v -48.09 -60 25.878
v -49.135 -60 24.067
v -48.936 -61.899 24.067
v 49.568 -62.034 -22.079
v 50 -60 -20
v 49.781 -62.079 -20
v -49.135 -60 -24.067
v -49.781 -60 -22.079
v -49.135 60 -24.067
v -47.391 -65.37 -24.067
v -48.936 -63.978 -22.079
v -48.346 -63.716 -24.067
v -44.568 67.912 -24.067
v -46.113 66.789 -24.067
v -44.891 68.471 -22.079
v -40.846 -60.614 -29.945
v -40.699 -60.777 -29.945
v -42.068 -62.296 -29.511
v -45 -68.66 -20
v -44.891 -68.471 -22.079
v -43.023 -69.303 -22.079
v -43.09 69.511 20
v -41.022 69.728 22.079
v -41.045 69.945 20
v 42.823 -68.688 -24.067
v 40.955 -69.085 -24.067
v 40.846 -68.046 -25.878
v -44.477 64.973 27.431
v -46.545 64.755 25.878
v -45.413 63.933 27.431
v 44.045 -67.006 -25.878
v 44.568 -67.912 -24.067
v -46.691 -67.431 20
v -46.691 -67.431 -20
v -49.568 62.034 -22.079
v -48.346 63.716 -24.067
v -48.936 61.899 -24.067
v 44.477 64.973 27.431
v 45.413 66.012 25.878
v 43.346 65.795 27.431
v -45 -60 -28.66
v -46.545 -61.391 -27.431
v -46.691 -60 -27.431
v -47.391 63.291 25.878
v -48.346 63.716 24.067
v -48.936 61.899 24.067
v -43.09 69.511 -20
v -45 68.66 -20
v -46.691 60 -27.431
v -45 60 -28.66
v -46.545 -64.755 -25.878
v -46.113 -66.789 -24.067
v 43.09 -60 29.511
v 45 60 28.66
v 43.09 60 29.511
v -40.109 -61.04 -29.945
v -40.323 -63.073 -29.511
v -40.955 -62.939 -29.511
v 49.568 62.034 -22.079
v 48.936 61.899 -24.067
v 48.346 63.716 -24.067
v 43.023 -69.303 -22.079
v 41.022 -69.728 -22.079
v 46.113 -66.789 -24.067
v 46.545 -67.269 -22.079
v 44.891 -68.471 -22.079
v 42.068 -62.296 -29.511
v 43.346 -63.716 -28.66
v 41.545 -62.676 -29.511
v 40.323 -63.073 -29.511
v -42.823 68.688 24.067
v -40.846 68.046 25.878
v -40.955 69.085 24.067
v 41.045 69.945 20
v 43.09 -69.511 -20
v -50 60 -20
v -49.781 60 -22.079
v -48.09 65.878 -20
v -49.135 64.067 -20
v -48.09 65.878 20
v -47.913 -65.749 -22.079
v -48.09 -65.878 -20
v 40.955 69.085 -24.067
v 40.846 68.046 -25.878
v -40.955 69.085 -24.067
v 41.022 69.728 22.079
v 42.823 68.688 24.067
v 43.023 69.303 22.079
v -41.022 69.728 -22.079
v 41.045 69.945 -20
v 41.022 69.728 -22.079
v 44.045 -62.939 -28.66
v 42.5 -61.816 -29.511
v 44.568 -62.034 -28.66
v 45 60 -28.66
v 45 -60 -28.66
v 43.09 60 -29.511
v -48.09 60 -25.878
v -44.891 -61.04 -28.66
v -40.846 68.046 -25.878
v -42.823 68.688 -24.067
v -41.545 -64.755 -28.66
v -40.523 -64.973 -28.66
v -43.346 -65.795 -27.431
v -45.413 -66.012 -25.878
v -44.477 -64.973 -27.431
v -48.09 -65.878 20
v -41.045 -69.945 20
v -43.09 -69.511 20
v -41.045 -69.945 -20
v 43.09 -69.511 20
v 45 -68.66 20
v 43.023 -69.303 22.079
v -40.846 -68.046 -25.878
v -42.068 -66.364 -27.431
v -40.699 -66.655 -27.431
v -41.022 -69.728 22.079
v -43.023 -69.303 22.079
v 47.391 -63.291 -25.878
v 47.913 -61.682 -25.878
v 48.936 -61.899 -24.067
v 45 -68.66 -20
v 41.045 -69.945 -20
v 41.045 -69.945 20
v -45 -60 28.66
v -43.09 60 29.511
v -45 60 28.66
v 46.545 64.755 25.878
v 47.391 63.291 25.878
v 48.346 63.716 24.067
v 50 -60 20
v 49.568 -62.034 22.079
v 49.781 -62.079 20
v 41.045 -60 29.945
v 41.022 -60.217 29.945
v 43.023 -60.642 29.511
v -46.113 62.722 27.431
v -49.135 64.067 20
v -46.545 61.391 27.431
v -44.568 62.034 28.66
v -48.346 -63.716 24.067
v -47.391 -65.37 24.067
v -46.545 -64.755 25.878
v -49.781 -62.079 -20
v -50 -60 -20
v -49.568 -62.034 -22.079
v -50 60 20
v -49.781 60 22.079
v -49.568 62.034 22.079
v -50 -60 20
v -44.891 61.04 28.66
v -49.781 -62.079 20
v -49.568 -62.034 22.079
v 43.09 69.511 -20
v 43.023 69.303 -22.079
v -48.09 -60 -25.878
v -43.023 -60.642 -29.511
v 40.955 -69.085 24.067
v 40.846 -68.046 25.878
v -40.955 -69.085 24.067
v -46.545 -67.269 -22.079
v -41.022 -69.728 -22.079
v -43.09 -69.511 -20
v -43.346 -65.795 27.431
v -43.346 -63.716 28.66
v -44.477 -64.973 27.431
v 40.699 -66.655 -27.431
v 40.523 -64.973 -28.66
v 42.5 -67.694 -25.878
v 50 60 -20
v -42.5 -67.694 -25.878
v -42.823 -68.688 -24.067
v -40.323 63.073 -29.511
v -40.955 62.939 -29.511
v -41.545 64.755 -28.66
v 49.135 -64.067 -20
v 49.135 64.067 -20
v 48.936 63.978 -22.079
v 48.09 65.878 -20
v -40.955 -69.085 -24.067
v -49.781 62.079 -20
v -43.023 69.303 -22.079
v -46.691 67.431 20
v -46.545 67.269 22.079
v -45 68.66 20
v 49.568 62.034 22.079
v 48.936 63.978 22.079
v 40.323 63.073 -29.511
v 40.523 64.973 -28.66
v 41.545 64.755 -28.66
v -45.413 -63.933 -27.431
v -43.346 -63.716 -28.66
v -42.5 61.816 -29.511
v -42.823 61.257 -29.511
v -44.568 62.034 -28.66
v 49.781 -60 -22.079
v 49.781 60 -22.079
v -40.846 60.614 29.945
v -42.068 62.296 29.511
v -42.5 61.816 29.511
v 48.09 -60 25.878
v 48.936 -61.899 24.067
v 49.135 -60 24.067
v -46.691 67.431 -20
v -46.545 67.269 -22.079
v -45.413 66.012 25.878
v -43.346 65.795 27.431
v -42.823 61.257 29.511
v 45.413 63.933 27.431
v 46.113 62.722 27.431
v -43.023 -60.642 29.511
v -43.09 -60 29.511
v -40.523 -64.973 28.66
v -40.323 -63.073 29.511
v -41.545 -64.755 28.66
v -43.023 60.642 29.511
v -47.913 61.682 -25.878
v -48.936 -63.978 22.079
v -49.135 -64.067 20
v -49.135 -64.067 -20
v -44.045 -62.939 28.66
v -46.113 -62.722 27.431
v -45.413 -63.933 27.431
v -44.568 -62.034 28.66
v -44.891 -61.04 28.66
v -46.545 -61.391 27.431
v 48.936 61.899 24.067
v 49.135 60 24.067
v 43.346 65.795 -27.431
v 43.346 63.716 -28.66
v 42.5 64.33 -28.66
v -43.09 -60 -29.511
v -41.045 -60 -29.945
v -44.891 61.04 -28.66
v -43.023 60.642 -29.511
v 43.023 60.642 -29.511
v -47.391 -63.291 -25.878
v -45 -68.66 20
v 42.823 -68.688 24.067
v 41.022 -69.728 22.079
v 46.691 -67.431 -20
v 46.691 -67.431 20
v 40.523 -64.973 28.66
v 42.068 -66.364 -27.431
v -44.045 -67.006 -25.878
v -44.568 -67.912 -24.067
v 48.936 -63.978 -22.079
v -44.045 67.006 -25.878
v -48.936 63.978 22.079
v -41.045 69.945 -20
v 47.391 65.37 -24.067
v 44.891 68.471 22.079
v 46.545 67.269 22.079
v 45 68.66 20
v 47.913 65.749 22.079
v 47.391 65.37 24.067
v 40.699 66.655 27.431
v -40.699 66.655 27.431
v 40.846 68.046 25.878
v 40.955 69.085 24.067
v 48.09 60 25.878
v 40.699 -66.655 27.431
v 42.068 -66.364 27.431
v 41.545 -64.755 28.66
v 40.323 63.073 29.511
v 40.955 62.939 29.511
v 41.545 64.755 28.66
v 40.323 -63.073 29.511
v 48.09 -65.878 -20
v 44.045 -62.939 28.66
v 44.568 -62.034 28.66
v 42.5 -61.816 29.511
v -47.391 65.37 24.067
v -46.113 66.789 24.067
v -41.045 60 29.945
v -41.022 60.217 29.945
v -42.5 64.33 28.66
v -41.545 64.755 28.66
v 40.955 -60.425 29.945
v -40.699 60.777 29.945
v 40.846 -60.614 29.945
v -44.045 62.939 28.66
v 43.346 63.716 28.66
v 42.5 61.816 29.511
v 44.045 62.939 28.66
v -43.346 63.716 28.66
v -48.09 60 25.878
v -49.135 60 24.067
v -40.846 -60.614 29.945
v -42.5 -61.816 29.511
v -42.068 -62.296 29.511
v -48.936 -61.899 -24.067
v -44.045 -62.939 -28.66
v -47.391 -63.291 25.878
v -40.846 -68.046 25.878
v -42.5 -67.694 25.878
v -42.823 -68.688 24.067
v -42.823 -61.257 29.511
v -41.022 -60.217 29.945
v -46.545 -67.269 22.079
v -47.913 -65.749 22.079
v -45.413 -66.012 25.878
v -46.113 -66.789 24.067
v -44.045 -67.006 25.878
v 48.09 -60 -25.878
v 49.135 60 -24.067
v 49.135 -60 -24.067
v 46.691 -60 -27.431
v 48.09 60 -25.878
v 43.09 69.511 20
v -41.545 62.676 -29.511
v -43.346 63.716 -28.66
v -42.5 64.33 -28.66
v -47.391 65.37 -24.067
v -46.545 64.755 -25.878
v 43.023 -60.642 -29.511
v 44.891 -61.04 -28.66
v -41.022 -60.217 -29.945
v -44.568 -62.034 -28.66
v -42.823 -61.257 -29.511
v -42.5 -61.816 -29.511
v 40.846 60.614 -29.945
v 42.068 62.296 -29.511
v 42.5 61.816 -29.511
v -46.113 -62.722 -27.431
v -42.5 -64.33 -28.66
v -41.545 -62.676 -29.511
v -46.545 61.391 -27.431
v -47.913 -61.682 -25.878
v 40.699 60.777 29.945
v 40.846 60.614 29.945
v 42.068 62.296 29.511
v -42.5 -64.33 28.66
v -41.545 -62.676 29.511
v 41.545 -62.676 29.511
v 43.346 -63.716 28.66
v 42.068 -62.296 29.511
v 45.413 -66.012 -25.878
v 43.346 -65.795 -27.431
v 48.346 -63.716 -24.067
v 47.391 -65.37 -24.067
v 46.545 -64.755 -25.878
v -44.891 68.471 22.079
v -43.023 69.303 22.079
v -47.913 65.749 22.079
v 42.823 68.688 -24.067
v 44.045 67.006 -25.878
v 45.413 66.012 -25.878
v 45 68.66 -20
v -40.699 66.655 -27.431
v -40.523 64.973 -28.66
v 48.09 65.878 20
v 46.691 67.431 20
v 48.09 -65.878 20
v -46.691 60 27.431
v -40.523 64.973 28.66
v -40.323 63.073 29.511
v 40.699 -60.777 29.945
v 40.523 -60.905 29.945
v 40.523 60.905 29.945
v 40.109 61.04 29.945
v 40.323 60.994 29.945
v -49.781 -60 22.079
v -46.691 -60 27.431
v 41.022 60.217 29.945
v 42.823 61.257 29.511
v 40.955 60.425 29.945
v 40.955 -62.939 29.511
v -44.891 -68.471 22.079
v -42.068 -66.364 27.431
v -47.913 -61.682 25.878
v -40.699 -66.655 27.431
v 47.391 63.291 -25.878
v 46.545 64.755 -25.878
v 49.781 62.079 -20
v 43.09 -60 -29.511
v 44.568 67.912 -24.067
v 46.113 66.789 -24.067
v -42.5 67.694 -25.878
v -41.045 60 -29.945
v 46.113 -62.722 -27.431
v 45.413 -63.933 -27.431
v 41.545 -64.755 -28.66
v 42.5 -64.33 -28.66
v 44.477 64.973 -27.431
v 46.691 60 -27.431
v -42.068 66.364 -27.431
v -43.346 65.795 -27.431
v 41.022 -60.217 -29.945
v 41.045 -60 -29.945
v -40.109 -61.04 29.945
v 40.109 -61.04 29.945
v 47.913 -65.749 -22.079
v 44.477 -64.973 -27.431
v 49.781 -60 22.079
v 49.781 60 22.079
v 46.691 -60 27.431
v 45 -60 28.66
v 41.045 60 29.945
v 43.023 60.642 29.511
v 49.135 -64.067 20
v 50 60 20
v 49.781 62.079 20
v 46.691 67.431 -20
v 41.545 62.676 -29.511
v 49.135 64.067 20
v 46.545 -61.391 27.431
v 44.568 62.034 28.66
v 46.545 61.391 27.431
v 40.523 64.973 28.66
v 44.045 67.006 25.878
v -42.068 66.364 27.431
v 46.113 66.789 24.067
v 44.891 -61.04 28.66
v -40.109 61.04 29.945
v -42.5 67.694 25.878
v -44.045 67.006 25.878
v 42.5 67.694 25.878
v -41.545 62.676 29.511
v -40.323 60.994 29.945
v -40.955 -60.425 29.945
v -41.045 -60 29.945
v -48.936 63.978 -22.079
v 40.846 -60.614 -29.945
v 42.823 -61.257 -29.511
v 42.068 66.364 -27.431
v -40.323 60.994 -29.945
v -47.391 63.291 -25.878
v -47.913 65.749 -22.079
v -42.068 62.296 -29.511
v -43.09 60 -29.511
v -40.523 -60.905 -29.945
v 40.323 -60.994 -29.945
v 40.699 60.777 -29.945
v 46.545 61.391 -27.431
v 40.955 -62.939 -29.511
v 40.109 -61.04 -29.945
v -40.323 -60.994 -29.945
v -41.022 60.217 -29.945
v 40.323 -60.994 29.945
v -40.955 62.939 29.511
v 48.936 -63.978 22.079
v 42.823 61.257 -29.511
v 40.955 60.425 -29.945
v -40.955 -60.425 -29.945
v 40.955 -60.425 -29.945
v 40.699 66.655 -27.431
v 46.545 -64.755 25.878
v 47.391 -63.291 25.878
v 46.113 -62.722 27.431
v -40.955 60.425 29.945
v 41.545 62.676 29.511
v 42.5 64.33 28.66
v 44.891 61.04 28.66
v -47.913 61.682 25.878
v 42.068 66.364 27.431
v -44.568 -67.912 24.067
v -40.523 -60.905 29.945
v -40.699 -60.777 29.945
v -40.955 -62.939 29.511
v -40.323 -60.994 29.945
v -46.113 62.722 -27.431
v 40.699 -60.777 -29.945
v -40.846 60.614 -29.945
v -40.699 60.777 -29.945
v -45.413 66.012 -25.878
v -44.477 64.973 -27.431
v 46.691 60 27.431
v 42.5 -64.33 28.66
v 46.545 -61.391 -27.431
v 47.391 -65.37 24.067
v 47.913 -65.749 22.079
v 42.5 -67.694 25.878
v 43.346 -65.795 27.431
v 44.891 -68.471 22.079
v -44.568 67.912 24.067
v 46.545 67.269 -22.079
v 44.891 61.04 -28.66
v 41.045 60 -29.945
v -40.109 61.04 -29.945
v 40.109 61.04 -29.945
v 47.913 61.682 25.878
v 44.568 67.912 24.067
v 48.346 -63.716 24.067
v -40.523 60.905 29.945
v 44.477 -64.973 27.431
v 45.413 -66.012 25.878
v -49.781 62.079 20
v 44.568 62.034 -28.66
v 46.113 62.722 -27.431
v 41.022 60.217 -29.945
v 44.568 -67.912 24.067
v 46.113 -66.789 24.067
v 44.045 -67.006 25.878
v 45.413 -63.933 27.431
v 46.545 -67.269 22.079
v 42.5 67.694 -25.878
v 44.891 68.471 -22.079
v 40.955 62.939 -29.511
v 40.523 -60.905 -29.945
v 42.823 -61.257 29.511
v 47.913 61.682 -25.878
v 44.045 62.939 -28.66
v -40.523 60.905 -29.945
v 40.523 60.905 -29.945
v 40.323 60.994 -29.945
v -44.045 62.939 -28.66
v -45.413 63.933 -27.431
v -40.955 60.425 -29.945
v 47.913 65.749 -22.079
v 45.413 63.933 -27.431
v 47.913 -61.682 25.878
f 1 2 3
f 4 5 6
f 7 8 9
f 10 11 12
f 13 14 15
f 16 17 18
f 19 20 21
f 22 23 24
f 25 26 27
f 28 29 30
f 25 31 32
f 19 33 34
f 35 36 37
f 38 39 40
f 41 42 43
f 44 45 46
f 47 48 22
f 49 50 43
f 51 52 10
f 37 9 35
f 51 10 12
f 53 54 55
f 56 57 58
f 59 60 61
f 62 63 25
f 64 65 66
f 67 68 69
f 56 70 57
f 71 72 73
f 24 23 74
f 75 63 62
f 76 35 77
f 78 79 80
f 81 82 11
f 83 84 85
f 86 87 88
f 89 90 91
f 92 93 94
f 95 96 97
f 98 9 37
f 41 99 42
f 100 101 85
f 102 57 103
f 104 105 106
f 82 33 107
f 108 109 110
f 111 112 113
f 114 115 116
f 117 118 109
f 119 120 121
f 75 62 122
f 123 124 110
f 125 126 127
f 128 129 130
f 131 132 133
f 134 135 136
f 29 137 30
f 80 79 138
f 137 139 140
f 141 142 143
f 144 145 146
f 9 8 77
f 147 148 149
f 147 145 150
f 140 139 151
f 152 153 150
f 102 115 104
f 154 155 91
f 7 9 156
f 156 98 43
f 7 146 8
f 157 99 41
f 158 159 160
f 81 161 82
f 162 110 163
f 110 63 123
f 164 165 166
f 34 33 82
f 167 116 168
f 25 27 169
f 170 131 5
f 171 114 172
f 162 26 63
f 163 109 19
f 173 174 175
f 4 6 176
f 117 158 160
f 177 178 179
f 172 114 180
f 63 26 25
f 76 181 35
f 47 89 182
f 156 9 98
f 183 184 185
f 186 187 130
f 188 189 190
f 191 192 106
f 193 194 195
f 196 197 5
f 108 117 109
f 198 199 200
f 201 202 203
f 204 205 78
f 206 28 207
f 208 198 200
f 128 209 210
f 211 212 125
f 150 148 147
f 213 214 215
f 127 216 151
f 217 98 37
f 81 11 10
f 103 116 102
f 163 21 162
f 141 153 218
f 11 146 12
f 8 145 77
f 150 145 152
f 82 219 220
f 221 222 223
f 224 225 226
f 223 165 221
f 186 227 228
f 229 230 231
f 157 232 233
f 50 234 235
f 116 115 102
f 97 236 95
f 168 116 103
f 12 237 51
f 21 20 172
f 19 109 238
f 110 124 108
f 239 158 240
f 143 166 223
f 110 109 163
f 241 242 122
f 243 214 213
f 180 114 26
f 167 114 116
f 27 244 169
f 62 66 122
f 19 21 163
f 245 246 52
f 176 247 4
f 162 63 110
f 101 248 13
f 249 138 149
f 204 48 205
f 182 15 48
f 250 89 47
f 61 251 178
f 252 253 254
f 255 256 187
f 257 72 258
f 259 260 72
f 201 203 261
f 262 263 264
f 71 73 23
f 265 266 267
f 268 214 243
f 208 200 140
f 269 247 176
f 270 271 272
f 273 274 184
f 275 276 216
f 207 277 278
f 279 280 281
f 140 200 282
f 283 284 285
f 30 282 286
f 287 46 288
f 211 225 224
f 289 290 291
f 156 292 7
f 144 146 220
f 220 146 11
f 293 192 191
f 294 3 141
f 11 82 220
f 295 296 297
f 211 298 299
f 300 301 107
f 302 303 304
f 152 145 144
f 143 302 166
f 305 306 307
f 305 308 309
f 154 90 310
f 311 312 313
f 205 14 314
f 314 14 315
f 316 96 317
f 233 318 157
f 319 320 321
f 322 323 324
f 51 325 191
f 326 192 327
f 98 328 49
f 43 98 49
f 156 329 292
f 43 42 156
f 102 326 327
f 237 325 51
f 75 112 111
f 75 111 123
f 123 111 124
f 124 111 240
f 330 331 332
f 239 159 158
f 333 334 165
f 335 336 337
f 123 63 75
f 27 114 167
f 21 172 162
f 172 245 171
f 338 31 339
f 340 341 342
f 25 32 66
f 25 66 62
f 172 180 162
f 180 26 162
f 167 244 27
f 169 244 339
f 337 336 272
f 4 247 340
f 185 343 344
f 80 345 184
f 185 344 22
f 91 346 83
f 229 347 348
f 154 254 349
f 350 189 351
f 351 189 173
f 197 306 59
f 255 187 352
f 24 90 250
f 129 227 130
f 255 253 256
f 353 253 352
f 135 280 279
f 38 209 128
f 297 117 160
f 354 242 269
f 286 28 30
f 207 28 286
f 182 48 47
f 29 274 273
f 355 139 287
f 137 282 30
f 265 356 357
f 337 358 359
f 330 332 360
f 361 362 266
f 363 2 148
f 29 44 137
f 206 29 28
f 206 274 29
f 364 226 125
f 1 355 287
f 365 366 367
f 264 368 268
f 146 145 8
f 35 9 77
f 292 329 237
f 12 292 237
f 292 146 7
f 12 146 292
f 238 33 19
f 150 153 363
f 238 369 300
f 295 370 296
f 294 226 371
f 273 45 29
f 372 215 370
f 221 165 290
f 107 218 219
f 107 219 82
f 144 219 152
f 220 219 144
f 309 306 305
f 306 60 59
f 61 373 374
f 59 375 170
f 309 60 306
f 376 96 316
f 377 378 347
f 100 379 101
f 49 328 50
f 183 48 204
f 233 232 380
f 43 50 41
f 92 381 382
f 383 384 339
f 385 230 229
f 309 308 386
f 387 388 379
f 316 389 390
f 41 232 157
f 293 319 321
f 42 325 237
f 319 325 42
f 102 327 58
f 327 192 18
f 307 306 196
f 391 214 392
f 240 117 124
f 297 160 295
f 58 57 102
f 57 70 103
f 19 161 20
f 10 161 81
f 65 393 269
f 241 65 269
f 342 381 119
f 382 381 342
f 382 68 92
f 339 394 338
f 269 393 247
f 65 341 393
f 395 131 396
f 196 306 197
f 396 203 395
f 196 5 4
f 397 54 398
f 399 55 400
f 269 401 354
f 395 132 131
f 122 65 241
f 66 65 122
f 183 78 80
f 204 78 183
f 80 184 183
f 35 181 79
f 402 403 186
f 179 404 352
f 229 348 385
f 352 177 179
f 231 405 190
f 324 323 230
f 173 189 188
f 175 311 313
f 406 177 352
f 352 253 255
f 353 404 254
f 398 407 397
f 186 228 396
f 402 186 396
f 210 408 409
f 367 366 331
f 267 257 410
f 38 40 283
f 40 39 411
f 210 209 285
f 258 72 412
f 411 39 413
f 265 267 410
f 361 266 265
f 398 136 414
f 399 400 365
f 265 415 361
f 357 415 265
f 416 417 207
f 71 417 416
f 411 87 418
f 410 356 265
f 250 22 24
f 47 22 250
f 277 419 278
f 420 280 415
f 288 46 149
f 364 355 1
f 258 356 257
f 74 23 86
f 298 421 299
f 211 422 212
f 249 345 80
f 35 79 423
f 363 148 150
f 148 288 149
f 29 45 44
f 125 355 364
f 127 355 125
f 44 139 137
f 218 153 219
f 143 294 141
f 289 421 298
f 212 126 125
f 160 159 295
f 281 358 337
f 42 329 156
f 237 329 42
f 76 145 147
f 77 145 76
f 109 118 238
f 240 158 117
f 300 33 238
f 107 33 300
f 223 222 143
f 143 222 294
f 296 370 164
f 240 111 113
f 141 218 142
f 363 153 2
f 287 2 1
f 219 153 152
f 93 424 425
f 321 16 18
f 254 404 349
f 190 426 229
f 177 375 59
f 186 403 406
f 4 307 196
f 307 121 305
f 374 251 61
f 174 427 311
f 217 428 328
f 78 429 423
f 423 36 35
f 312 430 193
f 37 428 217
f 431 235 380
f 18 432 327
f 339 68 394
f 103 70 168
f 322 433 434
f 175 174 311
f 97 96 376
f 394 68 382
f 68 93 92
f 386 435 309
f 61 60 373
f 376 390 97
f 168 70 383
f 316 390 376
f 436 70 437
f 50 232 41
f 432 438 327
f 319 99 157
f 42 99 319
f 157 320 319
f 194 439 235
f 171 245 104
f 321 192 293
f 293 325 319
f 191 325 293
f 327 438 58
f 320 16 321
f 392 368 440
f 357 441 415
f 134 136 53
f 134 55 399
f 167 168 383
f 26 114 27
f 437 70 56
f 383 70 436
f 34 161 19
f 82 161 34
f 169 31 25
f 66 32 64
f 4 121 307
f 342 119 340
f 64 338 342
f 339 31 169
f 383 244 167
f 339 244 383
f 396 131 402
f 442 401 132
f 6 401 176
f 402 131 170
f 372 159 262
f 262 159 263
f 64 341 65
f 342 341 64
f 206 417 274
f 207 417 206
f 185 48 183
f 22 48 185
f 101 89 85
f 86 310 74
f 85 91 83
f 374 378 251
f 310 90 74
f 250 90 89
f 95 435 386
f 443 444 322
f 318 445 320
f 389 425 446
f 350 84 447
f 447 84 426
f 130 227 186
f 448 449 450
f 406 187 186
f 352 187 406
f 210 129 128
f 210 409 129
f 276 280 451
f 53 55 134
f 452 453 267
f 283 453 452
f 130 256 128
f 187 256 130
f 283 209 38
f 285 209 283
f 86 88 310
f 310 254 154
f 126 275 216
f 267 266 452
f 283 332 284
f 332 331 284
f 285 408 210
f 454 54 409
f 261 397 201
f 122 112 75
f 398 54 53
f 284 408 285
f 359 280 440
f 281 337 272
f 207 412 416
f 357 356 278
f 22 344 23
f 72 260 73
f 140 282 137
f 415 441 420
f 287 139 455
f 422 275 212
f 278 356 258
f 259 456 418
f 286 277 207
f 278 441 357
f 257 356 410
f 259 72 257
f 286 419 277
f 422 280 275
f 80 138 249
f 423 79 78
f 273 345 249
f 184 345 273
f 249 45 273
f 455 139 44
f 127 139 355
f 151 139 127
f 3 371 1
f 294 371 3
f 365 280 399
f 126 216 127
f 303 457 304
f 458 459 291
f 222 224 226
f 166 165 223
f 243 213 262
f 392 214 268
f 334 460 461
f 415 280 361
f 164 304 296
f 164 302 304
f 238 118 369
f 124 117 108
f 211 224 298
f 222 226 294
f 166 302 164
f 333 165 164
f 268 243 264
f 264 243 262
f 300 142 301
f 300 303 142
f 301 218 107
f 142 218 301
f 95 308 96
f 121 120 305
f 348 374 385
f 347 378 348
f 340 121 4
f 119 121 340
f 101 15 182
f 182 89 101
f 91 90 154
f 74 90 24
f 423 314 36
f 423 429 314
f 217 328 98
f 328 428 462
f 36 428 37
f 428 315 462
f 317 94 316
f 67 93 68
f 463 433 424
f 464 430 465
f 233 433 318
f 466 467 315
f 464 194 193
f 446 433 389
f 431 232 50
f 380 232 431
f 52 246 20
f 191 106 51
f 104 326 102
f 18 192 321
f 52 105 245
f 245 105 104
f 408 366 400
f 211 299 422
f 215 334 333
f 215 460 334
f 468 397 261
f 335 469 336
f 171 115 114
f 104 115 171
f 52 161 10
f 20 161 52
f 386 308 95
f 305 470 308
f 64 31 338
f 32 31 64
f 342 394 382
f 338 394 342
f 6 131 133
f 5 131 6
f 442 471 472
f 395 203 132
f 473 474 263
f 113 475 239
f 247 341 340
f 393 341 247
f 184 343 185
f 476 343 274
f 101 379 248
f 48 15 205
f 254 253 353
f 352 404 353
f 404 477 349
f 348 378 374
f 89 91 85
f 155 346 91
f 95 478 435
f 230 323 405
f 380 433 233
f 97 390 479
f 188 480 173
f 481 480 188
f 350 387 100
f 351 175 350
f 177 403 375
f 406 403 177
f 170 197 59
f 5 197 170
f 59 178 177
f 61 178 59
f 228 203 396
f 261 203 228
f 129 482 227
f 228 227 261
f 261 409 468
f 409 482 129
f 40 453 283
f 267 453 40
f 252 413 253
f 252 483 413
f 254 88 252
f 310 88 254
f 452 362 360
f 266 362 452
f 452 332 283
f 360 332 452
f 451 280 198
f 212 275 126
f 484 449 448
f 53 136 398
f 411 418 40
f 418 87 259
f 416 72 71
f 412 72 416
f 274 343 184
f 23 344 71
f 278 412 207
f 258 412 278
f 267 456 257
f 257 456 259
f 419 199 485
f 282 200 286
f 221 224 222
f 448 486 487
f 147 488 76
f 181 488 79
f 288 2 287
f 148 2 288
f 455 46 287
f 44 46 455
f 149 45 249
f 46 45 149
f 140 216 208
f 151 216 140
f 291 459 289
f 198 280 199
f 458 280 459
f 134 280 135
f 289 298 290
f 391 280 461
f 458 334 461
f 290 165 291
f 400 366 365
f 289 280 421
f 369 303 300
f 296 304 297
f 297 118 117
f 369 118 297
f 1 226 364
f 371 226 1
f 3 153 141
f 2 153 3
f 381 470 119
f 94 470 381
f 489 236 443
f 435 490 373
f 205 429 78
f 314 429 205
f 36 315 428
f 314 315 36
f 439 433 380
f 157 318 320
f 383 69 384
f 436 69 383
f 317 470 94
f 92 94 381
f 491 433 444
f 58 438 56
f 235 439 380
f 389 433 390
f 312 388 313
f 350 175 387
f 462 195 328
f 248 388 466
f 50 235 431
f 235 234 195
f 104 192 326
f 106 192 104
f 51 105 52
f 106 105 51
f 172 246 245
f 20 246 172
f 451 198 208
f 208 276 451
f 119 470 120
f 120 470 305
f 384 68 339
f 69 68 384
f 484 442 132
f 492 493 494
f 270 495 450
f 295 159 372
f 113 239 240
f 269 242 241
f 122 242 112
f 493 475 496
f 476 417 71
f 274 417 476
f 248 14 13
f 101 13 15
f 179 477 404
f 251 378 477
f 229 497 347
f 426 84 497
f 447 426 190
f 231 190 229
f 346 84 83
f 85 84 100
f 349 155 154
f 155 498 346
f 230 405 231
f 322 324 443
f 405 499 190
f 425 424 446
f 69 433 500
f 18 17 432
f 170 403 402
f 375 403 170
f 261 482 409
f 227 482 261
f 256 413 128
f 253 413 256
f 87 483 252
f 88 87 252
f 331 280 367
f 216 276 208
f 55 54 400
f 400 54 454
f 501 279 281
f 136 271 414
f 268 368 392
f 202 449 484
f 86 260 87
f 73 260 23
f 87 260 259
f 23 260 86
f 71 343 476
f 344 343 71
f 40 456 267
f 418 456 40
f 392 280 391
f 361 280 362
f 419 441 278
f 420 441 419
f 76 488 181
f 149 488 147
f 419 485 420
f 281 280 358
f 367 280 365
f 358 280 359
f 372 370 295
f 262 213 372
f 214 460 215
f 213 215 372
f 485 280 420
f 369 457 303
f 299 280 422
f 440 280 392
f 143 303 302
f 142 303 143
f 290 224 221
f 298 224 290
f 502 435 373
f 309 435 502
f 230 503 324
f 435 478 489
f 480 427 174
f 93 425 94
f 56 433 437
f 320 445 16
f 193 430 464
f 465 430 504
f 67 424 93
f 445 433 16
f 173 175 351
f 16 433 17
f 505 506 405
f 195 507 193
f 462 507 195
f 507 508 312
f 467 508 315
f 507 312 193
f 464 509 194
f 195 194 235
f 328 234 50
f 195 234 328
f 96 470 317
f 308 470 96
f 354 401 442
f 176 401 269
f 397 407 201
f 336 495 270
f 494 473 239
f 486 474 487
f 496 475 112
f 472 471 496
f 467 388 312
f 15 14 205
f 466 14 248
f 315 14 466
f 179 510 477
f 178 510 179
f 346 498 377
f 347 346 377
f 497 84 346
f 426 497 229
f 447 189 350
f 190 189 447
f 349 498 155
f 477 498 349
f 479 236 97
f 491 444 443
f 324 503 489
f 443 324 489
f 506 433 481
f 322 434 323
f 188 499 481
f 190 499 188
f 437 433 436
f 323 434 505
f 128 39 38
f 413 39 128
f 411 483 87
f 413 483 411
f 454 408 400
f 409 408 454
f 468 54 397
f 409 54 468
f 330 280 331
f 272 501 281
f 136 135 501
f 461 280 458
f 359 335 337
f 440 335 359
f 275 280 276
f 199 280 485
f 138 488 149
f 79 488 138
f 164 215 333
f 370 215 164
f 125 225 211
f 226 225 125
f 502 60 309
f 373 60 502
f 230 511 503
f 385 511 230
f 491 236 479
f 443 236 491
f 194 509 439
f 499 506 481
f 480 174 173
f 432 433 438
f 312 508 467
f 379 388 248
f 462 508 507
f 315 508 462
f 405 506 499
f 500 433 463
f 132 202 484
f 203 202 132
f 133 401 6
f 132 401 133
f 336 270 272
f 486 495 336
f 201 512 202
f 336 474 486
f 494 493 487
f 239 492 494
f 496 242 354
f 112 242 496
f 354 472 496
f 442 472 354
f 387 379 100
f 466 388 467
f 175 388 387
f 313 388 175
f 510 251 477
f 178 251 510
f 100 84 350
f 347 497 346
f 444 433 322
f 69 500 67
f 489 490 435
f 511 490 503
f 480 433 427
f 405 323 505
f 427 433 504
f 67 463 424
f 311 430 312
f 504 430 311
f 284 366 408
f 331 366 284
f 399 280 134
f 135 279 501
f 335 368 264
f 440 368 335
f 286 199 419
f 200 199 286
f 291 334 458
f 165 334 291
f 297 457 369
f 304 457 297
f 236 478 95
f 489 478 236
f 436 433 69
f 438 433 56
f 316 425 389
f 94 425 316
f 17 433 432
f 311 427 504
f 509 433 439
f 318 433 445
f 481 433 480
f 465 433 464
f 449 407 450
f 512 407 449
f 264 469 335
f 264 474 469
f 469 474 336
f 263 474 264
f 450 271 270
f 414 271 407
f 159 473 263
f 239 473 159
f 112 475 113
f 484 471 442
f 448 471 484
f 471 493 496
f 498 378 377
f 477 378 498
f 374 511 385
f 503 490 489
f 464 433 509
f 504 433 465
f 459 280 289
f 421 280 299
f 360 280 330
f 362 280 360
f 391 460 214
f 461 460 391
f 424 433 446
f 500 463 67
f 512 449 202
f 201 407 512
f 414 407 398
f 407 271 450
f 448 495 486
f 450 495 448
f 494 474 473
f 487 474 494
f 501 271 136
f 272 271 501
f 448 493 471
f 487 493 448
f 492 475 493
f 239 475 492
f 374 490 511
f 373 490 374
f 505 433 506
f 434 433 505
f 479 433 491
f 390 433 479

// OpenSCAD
x = 40;
y = 60;
z = 20;

points = [
    [-x, -y, -z],
    [-x, -y, z],
    [-x, y, -z],
    [-x, y, z],
    [x, -y, -z],
    [x, -y, z],
    [x, y, -z],
    [x, y, z]];

hull() {
    for (p = points){
        translate(p) sphere(10);
    }
}
